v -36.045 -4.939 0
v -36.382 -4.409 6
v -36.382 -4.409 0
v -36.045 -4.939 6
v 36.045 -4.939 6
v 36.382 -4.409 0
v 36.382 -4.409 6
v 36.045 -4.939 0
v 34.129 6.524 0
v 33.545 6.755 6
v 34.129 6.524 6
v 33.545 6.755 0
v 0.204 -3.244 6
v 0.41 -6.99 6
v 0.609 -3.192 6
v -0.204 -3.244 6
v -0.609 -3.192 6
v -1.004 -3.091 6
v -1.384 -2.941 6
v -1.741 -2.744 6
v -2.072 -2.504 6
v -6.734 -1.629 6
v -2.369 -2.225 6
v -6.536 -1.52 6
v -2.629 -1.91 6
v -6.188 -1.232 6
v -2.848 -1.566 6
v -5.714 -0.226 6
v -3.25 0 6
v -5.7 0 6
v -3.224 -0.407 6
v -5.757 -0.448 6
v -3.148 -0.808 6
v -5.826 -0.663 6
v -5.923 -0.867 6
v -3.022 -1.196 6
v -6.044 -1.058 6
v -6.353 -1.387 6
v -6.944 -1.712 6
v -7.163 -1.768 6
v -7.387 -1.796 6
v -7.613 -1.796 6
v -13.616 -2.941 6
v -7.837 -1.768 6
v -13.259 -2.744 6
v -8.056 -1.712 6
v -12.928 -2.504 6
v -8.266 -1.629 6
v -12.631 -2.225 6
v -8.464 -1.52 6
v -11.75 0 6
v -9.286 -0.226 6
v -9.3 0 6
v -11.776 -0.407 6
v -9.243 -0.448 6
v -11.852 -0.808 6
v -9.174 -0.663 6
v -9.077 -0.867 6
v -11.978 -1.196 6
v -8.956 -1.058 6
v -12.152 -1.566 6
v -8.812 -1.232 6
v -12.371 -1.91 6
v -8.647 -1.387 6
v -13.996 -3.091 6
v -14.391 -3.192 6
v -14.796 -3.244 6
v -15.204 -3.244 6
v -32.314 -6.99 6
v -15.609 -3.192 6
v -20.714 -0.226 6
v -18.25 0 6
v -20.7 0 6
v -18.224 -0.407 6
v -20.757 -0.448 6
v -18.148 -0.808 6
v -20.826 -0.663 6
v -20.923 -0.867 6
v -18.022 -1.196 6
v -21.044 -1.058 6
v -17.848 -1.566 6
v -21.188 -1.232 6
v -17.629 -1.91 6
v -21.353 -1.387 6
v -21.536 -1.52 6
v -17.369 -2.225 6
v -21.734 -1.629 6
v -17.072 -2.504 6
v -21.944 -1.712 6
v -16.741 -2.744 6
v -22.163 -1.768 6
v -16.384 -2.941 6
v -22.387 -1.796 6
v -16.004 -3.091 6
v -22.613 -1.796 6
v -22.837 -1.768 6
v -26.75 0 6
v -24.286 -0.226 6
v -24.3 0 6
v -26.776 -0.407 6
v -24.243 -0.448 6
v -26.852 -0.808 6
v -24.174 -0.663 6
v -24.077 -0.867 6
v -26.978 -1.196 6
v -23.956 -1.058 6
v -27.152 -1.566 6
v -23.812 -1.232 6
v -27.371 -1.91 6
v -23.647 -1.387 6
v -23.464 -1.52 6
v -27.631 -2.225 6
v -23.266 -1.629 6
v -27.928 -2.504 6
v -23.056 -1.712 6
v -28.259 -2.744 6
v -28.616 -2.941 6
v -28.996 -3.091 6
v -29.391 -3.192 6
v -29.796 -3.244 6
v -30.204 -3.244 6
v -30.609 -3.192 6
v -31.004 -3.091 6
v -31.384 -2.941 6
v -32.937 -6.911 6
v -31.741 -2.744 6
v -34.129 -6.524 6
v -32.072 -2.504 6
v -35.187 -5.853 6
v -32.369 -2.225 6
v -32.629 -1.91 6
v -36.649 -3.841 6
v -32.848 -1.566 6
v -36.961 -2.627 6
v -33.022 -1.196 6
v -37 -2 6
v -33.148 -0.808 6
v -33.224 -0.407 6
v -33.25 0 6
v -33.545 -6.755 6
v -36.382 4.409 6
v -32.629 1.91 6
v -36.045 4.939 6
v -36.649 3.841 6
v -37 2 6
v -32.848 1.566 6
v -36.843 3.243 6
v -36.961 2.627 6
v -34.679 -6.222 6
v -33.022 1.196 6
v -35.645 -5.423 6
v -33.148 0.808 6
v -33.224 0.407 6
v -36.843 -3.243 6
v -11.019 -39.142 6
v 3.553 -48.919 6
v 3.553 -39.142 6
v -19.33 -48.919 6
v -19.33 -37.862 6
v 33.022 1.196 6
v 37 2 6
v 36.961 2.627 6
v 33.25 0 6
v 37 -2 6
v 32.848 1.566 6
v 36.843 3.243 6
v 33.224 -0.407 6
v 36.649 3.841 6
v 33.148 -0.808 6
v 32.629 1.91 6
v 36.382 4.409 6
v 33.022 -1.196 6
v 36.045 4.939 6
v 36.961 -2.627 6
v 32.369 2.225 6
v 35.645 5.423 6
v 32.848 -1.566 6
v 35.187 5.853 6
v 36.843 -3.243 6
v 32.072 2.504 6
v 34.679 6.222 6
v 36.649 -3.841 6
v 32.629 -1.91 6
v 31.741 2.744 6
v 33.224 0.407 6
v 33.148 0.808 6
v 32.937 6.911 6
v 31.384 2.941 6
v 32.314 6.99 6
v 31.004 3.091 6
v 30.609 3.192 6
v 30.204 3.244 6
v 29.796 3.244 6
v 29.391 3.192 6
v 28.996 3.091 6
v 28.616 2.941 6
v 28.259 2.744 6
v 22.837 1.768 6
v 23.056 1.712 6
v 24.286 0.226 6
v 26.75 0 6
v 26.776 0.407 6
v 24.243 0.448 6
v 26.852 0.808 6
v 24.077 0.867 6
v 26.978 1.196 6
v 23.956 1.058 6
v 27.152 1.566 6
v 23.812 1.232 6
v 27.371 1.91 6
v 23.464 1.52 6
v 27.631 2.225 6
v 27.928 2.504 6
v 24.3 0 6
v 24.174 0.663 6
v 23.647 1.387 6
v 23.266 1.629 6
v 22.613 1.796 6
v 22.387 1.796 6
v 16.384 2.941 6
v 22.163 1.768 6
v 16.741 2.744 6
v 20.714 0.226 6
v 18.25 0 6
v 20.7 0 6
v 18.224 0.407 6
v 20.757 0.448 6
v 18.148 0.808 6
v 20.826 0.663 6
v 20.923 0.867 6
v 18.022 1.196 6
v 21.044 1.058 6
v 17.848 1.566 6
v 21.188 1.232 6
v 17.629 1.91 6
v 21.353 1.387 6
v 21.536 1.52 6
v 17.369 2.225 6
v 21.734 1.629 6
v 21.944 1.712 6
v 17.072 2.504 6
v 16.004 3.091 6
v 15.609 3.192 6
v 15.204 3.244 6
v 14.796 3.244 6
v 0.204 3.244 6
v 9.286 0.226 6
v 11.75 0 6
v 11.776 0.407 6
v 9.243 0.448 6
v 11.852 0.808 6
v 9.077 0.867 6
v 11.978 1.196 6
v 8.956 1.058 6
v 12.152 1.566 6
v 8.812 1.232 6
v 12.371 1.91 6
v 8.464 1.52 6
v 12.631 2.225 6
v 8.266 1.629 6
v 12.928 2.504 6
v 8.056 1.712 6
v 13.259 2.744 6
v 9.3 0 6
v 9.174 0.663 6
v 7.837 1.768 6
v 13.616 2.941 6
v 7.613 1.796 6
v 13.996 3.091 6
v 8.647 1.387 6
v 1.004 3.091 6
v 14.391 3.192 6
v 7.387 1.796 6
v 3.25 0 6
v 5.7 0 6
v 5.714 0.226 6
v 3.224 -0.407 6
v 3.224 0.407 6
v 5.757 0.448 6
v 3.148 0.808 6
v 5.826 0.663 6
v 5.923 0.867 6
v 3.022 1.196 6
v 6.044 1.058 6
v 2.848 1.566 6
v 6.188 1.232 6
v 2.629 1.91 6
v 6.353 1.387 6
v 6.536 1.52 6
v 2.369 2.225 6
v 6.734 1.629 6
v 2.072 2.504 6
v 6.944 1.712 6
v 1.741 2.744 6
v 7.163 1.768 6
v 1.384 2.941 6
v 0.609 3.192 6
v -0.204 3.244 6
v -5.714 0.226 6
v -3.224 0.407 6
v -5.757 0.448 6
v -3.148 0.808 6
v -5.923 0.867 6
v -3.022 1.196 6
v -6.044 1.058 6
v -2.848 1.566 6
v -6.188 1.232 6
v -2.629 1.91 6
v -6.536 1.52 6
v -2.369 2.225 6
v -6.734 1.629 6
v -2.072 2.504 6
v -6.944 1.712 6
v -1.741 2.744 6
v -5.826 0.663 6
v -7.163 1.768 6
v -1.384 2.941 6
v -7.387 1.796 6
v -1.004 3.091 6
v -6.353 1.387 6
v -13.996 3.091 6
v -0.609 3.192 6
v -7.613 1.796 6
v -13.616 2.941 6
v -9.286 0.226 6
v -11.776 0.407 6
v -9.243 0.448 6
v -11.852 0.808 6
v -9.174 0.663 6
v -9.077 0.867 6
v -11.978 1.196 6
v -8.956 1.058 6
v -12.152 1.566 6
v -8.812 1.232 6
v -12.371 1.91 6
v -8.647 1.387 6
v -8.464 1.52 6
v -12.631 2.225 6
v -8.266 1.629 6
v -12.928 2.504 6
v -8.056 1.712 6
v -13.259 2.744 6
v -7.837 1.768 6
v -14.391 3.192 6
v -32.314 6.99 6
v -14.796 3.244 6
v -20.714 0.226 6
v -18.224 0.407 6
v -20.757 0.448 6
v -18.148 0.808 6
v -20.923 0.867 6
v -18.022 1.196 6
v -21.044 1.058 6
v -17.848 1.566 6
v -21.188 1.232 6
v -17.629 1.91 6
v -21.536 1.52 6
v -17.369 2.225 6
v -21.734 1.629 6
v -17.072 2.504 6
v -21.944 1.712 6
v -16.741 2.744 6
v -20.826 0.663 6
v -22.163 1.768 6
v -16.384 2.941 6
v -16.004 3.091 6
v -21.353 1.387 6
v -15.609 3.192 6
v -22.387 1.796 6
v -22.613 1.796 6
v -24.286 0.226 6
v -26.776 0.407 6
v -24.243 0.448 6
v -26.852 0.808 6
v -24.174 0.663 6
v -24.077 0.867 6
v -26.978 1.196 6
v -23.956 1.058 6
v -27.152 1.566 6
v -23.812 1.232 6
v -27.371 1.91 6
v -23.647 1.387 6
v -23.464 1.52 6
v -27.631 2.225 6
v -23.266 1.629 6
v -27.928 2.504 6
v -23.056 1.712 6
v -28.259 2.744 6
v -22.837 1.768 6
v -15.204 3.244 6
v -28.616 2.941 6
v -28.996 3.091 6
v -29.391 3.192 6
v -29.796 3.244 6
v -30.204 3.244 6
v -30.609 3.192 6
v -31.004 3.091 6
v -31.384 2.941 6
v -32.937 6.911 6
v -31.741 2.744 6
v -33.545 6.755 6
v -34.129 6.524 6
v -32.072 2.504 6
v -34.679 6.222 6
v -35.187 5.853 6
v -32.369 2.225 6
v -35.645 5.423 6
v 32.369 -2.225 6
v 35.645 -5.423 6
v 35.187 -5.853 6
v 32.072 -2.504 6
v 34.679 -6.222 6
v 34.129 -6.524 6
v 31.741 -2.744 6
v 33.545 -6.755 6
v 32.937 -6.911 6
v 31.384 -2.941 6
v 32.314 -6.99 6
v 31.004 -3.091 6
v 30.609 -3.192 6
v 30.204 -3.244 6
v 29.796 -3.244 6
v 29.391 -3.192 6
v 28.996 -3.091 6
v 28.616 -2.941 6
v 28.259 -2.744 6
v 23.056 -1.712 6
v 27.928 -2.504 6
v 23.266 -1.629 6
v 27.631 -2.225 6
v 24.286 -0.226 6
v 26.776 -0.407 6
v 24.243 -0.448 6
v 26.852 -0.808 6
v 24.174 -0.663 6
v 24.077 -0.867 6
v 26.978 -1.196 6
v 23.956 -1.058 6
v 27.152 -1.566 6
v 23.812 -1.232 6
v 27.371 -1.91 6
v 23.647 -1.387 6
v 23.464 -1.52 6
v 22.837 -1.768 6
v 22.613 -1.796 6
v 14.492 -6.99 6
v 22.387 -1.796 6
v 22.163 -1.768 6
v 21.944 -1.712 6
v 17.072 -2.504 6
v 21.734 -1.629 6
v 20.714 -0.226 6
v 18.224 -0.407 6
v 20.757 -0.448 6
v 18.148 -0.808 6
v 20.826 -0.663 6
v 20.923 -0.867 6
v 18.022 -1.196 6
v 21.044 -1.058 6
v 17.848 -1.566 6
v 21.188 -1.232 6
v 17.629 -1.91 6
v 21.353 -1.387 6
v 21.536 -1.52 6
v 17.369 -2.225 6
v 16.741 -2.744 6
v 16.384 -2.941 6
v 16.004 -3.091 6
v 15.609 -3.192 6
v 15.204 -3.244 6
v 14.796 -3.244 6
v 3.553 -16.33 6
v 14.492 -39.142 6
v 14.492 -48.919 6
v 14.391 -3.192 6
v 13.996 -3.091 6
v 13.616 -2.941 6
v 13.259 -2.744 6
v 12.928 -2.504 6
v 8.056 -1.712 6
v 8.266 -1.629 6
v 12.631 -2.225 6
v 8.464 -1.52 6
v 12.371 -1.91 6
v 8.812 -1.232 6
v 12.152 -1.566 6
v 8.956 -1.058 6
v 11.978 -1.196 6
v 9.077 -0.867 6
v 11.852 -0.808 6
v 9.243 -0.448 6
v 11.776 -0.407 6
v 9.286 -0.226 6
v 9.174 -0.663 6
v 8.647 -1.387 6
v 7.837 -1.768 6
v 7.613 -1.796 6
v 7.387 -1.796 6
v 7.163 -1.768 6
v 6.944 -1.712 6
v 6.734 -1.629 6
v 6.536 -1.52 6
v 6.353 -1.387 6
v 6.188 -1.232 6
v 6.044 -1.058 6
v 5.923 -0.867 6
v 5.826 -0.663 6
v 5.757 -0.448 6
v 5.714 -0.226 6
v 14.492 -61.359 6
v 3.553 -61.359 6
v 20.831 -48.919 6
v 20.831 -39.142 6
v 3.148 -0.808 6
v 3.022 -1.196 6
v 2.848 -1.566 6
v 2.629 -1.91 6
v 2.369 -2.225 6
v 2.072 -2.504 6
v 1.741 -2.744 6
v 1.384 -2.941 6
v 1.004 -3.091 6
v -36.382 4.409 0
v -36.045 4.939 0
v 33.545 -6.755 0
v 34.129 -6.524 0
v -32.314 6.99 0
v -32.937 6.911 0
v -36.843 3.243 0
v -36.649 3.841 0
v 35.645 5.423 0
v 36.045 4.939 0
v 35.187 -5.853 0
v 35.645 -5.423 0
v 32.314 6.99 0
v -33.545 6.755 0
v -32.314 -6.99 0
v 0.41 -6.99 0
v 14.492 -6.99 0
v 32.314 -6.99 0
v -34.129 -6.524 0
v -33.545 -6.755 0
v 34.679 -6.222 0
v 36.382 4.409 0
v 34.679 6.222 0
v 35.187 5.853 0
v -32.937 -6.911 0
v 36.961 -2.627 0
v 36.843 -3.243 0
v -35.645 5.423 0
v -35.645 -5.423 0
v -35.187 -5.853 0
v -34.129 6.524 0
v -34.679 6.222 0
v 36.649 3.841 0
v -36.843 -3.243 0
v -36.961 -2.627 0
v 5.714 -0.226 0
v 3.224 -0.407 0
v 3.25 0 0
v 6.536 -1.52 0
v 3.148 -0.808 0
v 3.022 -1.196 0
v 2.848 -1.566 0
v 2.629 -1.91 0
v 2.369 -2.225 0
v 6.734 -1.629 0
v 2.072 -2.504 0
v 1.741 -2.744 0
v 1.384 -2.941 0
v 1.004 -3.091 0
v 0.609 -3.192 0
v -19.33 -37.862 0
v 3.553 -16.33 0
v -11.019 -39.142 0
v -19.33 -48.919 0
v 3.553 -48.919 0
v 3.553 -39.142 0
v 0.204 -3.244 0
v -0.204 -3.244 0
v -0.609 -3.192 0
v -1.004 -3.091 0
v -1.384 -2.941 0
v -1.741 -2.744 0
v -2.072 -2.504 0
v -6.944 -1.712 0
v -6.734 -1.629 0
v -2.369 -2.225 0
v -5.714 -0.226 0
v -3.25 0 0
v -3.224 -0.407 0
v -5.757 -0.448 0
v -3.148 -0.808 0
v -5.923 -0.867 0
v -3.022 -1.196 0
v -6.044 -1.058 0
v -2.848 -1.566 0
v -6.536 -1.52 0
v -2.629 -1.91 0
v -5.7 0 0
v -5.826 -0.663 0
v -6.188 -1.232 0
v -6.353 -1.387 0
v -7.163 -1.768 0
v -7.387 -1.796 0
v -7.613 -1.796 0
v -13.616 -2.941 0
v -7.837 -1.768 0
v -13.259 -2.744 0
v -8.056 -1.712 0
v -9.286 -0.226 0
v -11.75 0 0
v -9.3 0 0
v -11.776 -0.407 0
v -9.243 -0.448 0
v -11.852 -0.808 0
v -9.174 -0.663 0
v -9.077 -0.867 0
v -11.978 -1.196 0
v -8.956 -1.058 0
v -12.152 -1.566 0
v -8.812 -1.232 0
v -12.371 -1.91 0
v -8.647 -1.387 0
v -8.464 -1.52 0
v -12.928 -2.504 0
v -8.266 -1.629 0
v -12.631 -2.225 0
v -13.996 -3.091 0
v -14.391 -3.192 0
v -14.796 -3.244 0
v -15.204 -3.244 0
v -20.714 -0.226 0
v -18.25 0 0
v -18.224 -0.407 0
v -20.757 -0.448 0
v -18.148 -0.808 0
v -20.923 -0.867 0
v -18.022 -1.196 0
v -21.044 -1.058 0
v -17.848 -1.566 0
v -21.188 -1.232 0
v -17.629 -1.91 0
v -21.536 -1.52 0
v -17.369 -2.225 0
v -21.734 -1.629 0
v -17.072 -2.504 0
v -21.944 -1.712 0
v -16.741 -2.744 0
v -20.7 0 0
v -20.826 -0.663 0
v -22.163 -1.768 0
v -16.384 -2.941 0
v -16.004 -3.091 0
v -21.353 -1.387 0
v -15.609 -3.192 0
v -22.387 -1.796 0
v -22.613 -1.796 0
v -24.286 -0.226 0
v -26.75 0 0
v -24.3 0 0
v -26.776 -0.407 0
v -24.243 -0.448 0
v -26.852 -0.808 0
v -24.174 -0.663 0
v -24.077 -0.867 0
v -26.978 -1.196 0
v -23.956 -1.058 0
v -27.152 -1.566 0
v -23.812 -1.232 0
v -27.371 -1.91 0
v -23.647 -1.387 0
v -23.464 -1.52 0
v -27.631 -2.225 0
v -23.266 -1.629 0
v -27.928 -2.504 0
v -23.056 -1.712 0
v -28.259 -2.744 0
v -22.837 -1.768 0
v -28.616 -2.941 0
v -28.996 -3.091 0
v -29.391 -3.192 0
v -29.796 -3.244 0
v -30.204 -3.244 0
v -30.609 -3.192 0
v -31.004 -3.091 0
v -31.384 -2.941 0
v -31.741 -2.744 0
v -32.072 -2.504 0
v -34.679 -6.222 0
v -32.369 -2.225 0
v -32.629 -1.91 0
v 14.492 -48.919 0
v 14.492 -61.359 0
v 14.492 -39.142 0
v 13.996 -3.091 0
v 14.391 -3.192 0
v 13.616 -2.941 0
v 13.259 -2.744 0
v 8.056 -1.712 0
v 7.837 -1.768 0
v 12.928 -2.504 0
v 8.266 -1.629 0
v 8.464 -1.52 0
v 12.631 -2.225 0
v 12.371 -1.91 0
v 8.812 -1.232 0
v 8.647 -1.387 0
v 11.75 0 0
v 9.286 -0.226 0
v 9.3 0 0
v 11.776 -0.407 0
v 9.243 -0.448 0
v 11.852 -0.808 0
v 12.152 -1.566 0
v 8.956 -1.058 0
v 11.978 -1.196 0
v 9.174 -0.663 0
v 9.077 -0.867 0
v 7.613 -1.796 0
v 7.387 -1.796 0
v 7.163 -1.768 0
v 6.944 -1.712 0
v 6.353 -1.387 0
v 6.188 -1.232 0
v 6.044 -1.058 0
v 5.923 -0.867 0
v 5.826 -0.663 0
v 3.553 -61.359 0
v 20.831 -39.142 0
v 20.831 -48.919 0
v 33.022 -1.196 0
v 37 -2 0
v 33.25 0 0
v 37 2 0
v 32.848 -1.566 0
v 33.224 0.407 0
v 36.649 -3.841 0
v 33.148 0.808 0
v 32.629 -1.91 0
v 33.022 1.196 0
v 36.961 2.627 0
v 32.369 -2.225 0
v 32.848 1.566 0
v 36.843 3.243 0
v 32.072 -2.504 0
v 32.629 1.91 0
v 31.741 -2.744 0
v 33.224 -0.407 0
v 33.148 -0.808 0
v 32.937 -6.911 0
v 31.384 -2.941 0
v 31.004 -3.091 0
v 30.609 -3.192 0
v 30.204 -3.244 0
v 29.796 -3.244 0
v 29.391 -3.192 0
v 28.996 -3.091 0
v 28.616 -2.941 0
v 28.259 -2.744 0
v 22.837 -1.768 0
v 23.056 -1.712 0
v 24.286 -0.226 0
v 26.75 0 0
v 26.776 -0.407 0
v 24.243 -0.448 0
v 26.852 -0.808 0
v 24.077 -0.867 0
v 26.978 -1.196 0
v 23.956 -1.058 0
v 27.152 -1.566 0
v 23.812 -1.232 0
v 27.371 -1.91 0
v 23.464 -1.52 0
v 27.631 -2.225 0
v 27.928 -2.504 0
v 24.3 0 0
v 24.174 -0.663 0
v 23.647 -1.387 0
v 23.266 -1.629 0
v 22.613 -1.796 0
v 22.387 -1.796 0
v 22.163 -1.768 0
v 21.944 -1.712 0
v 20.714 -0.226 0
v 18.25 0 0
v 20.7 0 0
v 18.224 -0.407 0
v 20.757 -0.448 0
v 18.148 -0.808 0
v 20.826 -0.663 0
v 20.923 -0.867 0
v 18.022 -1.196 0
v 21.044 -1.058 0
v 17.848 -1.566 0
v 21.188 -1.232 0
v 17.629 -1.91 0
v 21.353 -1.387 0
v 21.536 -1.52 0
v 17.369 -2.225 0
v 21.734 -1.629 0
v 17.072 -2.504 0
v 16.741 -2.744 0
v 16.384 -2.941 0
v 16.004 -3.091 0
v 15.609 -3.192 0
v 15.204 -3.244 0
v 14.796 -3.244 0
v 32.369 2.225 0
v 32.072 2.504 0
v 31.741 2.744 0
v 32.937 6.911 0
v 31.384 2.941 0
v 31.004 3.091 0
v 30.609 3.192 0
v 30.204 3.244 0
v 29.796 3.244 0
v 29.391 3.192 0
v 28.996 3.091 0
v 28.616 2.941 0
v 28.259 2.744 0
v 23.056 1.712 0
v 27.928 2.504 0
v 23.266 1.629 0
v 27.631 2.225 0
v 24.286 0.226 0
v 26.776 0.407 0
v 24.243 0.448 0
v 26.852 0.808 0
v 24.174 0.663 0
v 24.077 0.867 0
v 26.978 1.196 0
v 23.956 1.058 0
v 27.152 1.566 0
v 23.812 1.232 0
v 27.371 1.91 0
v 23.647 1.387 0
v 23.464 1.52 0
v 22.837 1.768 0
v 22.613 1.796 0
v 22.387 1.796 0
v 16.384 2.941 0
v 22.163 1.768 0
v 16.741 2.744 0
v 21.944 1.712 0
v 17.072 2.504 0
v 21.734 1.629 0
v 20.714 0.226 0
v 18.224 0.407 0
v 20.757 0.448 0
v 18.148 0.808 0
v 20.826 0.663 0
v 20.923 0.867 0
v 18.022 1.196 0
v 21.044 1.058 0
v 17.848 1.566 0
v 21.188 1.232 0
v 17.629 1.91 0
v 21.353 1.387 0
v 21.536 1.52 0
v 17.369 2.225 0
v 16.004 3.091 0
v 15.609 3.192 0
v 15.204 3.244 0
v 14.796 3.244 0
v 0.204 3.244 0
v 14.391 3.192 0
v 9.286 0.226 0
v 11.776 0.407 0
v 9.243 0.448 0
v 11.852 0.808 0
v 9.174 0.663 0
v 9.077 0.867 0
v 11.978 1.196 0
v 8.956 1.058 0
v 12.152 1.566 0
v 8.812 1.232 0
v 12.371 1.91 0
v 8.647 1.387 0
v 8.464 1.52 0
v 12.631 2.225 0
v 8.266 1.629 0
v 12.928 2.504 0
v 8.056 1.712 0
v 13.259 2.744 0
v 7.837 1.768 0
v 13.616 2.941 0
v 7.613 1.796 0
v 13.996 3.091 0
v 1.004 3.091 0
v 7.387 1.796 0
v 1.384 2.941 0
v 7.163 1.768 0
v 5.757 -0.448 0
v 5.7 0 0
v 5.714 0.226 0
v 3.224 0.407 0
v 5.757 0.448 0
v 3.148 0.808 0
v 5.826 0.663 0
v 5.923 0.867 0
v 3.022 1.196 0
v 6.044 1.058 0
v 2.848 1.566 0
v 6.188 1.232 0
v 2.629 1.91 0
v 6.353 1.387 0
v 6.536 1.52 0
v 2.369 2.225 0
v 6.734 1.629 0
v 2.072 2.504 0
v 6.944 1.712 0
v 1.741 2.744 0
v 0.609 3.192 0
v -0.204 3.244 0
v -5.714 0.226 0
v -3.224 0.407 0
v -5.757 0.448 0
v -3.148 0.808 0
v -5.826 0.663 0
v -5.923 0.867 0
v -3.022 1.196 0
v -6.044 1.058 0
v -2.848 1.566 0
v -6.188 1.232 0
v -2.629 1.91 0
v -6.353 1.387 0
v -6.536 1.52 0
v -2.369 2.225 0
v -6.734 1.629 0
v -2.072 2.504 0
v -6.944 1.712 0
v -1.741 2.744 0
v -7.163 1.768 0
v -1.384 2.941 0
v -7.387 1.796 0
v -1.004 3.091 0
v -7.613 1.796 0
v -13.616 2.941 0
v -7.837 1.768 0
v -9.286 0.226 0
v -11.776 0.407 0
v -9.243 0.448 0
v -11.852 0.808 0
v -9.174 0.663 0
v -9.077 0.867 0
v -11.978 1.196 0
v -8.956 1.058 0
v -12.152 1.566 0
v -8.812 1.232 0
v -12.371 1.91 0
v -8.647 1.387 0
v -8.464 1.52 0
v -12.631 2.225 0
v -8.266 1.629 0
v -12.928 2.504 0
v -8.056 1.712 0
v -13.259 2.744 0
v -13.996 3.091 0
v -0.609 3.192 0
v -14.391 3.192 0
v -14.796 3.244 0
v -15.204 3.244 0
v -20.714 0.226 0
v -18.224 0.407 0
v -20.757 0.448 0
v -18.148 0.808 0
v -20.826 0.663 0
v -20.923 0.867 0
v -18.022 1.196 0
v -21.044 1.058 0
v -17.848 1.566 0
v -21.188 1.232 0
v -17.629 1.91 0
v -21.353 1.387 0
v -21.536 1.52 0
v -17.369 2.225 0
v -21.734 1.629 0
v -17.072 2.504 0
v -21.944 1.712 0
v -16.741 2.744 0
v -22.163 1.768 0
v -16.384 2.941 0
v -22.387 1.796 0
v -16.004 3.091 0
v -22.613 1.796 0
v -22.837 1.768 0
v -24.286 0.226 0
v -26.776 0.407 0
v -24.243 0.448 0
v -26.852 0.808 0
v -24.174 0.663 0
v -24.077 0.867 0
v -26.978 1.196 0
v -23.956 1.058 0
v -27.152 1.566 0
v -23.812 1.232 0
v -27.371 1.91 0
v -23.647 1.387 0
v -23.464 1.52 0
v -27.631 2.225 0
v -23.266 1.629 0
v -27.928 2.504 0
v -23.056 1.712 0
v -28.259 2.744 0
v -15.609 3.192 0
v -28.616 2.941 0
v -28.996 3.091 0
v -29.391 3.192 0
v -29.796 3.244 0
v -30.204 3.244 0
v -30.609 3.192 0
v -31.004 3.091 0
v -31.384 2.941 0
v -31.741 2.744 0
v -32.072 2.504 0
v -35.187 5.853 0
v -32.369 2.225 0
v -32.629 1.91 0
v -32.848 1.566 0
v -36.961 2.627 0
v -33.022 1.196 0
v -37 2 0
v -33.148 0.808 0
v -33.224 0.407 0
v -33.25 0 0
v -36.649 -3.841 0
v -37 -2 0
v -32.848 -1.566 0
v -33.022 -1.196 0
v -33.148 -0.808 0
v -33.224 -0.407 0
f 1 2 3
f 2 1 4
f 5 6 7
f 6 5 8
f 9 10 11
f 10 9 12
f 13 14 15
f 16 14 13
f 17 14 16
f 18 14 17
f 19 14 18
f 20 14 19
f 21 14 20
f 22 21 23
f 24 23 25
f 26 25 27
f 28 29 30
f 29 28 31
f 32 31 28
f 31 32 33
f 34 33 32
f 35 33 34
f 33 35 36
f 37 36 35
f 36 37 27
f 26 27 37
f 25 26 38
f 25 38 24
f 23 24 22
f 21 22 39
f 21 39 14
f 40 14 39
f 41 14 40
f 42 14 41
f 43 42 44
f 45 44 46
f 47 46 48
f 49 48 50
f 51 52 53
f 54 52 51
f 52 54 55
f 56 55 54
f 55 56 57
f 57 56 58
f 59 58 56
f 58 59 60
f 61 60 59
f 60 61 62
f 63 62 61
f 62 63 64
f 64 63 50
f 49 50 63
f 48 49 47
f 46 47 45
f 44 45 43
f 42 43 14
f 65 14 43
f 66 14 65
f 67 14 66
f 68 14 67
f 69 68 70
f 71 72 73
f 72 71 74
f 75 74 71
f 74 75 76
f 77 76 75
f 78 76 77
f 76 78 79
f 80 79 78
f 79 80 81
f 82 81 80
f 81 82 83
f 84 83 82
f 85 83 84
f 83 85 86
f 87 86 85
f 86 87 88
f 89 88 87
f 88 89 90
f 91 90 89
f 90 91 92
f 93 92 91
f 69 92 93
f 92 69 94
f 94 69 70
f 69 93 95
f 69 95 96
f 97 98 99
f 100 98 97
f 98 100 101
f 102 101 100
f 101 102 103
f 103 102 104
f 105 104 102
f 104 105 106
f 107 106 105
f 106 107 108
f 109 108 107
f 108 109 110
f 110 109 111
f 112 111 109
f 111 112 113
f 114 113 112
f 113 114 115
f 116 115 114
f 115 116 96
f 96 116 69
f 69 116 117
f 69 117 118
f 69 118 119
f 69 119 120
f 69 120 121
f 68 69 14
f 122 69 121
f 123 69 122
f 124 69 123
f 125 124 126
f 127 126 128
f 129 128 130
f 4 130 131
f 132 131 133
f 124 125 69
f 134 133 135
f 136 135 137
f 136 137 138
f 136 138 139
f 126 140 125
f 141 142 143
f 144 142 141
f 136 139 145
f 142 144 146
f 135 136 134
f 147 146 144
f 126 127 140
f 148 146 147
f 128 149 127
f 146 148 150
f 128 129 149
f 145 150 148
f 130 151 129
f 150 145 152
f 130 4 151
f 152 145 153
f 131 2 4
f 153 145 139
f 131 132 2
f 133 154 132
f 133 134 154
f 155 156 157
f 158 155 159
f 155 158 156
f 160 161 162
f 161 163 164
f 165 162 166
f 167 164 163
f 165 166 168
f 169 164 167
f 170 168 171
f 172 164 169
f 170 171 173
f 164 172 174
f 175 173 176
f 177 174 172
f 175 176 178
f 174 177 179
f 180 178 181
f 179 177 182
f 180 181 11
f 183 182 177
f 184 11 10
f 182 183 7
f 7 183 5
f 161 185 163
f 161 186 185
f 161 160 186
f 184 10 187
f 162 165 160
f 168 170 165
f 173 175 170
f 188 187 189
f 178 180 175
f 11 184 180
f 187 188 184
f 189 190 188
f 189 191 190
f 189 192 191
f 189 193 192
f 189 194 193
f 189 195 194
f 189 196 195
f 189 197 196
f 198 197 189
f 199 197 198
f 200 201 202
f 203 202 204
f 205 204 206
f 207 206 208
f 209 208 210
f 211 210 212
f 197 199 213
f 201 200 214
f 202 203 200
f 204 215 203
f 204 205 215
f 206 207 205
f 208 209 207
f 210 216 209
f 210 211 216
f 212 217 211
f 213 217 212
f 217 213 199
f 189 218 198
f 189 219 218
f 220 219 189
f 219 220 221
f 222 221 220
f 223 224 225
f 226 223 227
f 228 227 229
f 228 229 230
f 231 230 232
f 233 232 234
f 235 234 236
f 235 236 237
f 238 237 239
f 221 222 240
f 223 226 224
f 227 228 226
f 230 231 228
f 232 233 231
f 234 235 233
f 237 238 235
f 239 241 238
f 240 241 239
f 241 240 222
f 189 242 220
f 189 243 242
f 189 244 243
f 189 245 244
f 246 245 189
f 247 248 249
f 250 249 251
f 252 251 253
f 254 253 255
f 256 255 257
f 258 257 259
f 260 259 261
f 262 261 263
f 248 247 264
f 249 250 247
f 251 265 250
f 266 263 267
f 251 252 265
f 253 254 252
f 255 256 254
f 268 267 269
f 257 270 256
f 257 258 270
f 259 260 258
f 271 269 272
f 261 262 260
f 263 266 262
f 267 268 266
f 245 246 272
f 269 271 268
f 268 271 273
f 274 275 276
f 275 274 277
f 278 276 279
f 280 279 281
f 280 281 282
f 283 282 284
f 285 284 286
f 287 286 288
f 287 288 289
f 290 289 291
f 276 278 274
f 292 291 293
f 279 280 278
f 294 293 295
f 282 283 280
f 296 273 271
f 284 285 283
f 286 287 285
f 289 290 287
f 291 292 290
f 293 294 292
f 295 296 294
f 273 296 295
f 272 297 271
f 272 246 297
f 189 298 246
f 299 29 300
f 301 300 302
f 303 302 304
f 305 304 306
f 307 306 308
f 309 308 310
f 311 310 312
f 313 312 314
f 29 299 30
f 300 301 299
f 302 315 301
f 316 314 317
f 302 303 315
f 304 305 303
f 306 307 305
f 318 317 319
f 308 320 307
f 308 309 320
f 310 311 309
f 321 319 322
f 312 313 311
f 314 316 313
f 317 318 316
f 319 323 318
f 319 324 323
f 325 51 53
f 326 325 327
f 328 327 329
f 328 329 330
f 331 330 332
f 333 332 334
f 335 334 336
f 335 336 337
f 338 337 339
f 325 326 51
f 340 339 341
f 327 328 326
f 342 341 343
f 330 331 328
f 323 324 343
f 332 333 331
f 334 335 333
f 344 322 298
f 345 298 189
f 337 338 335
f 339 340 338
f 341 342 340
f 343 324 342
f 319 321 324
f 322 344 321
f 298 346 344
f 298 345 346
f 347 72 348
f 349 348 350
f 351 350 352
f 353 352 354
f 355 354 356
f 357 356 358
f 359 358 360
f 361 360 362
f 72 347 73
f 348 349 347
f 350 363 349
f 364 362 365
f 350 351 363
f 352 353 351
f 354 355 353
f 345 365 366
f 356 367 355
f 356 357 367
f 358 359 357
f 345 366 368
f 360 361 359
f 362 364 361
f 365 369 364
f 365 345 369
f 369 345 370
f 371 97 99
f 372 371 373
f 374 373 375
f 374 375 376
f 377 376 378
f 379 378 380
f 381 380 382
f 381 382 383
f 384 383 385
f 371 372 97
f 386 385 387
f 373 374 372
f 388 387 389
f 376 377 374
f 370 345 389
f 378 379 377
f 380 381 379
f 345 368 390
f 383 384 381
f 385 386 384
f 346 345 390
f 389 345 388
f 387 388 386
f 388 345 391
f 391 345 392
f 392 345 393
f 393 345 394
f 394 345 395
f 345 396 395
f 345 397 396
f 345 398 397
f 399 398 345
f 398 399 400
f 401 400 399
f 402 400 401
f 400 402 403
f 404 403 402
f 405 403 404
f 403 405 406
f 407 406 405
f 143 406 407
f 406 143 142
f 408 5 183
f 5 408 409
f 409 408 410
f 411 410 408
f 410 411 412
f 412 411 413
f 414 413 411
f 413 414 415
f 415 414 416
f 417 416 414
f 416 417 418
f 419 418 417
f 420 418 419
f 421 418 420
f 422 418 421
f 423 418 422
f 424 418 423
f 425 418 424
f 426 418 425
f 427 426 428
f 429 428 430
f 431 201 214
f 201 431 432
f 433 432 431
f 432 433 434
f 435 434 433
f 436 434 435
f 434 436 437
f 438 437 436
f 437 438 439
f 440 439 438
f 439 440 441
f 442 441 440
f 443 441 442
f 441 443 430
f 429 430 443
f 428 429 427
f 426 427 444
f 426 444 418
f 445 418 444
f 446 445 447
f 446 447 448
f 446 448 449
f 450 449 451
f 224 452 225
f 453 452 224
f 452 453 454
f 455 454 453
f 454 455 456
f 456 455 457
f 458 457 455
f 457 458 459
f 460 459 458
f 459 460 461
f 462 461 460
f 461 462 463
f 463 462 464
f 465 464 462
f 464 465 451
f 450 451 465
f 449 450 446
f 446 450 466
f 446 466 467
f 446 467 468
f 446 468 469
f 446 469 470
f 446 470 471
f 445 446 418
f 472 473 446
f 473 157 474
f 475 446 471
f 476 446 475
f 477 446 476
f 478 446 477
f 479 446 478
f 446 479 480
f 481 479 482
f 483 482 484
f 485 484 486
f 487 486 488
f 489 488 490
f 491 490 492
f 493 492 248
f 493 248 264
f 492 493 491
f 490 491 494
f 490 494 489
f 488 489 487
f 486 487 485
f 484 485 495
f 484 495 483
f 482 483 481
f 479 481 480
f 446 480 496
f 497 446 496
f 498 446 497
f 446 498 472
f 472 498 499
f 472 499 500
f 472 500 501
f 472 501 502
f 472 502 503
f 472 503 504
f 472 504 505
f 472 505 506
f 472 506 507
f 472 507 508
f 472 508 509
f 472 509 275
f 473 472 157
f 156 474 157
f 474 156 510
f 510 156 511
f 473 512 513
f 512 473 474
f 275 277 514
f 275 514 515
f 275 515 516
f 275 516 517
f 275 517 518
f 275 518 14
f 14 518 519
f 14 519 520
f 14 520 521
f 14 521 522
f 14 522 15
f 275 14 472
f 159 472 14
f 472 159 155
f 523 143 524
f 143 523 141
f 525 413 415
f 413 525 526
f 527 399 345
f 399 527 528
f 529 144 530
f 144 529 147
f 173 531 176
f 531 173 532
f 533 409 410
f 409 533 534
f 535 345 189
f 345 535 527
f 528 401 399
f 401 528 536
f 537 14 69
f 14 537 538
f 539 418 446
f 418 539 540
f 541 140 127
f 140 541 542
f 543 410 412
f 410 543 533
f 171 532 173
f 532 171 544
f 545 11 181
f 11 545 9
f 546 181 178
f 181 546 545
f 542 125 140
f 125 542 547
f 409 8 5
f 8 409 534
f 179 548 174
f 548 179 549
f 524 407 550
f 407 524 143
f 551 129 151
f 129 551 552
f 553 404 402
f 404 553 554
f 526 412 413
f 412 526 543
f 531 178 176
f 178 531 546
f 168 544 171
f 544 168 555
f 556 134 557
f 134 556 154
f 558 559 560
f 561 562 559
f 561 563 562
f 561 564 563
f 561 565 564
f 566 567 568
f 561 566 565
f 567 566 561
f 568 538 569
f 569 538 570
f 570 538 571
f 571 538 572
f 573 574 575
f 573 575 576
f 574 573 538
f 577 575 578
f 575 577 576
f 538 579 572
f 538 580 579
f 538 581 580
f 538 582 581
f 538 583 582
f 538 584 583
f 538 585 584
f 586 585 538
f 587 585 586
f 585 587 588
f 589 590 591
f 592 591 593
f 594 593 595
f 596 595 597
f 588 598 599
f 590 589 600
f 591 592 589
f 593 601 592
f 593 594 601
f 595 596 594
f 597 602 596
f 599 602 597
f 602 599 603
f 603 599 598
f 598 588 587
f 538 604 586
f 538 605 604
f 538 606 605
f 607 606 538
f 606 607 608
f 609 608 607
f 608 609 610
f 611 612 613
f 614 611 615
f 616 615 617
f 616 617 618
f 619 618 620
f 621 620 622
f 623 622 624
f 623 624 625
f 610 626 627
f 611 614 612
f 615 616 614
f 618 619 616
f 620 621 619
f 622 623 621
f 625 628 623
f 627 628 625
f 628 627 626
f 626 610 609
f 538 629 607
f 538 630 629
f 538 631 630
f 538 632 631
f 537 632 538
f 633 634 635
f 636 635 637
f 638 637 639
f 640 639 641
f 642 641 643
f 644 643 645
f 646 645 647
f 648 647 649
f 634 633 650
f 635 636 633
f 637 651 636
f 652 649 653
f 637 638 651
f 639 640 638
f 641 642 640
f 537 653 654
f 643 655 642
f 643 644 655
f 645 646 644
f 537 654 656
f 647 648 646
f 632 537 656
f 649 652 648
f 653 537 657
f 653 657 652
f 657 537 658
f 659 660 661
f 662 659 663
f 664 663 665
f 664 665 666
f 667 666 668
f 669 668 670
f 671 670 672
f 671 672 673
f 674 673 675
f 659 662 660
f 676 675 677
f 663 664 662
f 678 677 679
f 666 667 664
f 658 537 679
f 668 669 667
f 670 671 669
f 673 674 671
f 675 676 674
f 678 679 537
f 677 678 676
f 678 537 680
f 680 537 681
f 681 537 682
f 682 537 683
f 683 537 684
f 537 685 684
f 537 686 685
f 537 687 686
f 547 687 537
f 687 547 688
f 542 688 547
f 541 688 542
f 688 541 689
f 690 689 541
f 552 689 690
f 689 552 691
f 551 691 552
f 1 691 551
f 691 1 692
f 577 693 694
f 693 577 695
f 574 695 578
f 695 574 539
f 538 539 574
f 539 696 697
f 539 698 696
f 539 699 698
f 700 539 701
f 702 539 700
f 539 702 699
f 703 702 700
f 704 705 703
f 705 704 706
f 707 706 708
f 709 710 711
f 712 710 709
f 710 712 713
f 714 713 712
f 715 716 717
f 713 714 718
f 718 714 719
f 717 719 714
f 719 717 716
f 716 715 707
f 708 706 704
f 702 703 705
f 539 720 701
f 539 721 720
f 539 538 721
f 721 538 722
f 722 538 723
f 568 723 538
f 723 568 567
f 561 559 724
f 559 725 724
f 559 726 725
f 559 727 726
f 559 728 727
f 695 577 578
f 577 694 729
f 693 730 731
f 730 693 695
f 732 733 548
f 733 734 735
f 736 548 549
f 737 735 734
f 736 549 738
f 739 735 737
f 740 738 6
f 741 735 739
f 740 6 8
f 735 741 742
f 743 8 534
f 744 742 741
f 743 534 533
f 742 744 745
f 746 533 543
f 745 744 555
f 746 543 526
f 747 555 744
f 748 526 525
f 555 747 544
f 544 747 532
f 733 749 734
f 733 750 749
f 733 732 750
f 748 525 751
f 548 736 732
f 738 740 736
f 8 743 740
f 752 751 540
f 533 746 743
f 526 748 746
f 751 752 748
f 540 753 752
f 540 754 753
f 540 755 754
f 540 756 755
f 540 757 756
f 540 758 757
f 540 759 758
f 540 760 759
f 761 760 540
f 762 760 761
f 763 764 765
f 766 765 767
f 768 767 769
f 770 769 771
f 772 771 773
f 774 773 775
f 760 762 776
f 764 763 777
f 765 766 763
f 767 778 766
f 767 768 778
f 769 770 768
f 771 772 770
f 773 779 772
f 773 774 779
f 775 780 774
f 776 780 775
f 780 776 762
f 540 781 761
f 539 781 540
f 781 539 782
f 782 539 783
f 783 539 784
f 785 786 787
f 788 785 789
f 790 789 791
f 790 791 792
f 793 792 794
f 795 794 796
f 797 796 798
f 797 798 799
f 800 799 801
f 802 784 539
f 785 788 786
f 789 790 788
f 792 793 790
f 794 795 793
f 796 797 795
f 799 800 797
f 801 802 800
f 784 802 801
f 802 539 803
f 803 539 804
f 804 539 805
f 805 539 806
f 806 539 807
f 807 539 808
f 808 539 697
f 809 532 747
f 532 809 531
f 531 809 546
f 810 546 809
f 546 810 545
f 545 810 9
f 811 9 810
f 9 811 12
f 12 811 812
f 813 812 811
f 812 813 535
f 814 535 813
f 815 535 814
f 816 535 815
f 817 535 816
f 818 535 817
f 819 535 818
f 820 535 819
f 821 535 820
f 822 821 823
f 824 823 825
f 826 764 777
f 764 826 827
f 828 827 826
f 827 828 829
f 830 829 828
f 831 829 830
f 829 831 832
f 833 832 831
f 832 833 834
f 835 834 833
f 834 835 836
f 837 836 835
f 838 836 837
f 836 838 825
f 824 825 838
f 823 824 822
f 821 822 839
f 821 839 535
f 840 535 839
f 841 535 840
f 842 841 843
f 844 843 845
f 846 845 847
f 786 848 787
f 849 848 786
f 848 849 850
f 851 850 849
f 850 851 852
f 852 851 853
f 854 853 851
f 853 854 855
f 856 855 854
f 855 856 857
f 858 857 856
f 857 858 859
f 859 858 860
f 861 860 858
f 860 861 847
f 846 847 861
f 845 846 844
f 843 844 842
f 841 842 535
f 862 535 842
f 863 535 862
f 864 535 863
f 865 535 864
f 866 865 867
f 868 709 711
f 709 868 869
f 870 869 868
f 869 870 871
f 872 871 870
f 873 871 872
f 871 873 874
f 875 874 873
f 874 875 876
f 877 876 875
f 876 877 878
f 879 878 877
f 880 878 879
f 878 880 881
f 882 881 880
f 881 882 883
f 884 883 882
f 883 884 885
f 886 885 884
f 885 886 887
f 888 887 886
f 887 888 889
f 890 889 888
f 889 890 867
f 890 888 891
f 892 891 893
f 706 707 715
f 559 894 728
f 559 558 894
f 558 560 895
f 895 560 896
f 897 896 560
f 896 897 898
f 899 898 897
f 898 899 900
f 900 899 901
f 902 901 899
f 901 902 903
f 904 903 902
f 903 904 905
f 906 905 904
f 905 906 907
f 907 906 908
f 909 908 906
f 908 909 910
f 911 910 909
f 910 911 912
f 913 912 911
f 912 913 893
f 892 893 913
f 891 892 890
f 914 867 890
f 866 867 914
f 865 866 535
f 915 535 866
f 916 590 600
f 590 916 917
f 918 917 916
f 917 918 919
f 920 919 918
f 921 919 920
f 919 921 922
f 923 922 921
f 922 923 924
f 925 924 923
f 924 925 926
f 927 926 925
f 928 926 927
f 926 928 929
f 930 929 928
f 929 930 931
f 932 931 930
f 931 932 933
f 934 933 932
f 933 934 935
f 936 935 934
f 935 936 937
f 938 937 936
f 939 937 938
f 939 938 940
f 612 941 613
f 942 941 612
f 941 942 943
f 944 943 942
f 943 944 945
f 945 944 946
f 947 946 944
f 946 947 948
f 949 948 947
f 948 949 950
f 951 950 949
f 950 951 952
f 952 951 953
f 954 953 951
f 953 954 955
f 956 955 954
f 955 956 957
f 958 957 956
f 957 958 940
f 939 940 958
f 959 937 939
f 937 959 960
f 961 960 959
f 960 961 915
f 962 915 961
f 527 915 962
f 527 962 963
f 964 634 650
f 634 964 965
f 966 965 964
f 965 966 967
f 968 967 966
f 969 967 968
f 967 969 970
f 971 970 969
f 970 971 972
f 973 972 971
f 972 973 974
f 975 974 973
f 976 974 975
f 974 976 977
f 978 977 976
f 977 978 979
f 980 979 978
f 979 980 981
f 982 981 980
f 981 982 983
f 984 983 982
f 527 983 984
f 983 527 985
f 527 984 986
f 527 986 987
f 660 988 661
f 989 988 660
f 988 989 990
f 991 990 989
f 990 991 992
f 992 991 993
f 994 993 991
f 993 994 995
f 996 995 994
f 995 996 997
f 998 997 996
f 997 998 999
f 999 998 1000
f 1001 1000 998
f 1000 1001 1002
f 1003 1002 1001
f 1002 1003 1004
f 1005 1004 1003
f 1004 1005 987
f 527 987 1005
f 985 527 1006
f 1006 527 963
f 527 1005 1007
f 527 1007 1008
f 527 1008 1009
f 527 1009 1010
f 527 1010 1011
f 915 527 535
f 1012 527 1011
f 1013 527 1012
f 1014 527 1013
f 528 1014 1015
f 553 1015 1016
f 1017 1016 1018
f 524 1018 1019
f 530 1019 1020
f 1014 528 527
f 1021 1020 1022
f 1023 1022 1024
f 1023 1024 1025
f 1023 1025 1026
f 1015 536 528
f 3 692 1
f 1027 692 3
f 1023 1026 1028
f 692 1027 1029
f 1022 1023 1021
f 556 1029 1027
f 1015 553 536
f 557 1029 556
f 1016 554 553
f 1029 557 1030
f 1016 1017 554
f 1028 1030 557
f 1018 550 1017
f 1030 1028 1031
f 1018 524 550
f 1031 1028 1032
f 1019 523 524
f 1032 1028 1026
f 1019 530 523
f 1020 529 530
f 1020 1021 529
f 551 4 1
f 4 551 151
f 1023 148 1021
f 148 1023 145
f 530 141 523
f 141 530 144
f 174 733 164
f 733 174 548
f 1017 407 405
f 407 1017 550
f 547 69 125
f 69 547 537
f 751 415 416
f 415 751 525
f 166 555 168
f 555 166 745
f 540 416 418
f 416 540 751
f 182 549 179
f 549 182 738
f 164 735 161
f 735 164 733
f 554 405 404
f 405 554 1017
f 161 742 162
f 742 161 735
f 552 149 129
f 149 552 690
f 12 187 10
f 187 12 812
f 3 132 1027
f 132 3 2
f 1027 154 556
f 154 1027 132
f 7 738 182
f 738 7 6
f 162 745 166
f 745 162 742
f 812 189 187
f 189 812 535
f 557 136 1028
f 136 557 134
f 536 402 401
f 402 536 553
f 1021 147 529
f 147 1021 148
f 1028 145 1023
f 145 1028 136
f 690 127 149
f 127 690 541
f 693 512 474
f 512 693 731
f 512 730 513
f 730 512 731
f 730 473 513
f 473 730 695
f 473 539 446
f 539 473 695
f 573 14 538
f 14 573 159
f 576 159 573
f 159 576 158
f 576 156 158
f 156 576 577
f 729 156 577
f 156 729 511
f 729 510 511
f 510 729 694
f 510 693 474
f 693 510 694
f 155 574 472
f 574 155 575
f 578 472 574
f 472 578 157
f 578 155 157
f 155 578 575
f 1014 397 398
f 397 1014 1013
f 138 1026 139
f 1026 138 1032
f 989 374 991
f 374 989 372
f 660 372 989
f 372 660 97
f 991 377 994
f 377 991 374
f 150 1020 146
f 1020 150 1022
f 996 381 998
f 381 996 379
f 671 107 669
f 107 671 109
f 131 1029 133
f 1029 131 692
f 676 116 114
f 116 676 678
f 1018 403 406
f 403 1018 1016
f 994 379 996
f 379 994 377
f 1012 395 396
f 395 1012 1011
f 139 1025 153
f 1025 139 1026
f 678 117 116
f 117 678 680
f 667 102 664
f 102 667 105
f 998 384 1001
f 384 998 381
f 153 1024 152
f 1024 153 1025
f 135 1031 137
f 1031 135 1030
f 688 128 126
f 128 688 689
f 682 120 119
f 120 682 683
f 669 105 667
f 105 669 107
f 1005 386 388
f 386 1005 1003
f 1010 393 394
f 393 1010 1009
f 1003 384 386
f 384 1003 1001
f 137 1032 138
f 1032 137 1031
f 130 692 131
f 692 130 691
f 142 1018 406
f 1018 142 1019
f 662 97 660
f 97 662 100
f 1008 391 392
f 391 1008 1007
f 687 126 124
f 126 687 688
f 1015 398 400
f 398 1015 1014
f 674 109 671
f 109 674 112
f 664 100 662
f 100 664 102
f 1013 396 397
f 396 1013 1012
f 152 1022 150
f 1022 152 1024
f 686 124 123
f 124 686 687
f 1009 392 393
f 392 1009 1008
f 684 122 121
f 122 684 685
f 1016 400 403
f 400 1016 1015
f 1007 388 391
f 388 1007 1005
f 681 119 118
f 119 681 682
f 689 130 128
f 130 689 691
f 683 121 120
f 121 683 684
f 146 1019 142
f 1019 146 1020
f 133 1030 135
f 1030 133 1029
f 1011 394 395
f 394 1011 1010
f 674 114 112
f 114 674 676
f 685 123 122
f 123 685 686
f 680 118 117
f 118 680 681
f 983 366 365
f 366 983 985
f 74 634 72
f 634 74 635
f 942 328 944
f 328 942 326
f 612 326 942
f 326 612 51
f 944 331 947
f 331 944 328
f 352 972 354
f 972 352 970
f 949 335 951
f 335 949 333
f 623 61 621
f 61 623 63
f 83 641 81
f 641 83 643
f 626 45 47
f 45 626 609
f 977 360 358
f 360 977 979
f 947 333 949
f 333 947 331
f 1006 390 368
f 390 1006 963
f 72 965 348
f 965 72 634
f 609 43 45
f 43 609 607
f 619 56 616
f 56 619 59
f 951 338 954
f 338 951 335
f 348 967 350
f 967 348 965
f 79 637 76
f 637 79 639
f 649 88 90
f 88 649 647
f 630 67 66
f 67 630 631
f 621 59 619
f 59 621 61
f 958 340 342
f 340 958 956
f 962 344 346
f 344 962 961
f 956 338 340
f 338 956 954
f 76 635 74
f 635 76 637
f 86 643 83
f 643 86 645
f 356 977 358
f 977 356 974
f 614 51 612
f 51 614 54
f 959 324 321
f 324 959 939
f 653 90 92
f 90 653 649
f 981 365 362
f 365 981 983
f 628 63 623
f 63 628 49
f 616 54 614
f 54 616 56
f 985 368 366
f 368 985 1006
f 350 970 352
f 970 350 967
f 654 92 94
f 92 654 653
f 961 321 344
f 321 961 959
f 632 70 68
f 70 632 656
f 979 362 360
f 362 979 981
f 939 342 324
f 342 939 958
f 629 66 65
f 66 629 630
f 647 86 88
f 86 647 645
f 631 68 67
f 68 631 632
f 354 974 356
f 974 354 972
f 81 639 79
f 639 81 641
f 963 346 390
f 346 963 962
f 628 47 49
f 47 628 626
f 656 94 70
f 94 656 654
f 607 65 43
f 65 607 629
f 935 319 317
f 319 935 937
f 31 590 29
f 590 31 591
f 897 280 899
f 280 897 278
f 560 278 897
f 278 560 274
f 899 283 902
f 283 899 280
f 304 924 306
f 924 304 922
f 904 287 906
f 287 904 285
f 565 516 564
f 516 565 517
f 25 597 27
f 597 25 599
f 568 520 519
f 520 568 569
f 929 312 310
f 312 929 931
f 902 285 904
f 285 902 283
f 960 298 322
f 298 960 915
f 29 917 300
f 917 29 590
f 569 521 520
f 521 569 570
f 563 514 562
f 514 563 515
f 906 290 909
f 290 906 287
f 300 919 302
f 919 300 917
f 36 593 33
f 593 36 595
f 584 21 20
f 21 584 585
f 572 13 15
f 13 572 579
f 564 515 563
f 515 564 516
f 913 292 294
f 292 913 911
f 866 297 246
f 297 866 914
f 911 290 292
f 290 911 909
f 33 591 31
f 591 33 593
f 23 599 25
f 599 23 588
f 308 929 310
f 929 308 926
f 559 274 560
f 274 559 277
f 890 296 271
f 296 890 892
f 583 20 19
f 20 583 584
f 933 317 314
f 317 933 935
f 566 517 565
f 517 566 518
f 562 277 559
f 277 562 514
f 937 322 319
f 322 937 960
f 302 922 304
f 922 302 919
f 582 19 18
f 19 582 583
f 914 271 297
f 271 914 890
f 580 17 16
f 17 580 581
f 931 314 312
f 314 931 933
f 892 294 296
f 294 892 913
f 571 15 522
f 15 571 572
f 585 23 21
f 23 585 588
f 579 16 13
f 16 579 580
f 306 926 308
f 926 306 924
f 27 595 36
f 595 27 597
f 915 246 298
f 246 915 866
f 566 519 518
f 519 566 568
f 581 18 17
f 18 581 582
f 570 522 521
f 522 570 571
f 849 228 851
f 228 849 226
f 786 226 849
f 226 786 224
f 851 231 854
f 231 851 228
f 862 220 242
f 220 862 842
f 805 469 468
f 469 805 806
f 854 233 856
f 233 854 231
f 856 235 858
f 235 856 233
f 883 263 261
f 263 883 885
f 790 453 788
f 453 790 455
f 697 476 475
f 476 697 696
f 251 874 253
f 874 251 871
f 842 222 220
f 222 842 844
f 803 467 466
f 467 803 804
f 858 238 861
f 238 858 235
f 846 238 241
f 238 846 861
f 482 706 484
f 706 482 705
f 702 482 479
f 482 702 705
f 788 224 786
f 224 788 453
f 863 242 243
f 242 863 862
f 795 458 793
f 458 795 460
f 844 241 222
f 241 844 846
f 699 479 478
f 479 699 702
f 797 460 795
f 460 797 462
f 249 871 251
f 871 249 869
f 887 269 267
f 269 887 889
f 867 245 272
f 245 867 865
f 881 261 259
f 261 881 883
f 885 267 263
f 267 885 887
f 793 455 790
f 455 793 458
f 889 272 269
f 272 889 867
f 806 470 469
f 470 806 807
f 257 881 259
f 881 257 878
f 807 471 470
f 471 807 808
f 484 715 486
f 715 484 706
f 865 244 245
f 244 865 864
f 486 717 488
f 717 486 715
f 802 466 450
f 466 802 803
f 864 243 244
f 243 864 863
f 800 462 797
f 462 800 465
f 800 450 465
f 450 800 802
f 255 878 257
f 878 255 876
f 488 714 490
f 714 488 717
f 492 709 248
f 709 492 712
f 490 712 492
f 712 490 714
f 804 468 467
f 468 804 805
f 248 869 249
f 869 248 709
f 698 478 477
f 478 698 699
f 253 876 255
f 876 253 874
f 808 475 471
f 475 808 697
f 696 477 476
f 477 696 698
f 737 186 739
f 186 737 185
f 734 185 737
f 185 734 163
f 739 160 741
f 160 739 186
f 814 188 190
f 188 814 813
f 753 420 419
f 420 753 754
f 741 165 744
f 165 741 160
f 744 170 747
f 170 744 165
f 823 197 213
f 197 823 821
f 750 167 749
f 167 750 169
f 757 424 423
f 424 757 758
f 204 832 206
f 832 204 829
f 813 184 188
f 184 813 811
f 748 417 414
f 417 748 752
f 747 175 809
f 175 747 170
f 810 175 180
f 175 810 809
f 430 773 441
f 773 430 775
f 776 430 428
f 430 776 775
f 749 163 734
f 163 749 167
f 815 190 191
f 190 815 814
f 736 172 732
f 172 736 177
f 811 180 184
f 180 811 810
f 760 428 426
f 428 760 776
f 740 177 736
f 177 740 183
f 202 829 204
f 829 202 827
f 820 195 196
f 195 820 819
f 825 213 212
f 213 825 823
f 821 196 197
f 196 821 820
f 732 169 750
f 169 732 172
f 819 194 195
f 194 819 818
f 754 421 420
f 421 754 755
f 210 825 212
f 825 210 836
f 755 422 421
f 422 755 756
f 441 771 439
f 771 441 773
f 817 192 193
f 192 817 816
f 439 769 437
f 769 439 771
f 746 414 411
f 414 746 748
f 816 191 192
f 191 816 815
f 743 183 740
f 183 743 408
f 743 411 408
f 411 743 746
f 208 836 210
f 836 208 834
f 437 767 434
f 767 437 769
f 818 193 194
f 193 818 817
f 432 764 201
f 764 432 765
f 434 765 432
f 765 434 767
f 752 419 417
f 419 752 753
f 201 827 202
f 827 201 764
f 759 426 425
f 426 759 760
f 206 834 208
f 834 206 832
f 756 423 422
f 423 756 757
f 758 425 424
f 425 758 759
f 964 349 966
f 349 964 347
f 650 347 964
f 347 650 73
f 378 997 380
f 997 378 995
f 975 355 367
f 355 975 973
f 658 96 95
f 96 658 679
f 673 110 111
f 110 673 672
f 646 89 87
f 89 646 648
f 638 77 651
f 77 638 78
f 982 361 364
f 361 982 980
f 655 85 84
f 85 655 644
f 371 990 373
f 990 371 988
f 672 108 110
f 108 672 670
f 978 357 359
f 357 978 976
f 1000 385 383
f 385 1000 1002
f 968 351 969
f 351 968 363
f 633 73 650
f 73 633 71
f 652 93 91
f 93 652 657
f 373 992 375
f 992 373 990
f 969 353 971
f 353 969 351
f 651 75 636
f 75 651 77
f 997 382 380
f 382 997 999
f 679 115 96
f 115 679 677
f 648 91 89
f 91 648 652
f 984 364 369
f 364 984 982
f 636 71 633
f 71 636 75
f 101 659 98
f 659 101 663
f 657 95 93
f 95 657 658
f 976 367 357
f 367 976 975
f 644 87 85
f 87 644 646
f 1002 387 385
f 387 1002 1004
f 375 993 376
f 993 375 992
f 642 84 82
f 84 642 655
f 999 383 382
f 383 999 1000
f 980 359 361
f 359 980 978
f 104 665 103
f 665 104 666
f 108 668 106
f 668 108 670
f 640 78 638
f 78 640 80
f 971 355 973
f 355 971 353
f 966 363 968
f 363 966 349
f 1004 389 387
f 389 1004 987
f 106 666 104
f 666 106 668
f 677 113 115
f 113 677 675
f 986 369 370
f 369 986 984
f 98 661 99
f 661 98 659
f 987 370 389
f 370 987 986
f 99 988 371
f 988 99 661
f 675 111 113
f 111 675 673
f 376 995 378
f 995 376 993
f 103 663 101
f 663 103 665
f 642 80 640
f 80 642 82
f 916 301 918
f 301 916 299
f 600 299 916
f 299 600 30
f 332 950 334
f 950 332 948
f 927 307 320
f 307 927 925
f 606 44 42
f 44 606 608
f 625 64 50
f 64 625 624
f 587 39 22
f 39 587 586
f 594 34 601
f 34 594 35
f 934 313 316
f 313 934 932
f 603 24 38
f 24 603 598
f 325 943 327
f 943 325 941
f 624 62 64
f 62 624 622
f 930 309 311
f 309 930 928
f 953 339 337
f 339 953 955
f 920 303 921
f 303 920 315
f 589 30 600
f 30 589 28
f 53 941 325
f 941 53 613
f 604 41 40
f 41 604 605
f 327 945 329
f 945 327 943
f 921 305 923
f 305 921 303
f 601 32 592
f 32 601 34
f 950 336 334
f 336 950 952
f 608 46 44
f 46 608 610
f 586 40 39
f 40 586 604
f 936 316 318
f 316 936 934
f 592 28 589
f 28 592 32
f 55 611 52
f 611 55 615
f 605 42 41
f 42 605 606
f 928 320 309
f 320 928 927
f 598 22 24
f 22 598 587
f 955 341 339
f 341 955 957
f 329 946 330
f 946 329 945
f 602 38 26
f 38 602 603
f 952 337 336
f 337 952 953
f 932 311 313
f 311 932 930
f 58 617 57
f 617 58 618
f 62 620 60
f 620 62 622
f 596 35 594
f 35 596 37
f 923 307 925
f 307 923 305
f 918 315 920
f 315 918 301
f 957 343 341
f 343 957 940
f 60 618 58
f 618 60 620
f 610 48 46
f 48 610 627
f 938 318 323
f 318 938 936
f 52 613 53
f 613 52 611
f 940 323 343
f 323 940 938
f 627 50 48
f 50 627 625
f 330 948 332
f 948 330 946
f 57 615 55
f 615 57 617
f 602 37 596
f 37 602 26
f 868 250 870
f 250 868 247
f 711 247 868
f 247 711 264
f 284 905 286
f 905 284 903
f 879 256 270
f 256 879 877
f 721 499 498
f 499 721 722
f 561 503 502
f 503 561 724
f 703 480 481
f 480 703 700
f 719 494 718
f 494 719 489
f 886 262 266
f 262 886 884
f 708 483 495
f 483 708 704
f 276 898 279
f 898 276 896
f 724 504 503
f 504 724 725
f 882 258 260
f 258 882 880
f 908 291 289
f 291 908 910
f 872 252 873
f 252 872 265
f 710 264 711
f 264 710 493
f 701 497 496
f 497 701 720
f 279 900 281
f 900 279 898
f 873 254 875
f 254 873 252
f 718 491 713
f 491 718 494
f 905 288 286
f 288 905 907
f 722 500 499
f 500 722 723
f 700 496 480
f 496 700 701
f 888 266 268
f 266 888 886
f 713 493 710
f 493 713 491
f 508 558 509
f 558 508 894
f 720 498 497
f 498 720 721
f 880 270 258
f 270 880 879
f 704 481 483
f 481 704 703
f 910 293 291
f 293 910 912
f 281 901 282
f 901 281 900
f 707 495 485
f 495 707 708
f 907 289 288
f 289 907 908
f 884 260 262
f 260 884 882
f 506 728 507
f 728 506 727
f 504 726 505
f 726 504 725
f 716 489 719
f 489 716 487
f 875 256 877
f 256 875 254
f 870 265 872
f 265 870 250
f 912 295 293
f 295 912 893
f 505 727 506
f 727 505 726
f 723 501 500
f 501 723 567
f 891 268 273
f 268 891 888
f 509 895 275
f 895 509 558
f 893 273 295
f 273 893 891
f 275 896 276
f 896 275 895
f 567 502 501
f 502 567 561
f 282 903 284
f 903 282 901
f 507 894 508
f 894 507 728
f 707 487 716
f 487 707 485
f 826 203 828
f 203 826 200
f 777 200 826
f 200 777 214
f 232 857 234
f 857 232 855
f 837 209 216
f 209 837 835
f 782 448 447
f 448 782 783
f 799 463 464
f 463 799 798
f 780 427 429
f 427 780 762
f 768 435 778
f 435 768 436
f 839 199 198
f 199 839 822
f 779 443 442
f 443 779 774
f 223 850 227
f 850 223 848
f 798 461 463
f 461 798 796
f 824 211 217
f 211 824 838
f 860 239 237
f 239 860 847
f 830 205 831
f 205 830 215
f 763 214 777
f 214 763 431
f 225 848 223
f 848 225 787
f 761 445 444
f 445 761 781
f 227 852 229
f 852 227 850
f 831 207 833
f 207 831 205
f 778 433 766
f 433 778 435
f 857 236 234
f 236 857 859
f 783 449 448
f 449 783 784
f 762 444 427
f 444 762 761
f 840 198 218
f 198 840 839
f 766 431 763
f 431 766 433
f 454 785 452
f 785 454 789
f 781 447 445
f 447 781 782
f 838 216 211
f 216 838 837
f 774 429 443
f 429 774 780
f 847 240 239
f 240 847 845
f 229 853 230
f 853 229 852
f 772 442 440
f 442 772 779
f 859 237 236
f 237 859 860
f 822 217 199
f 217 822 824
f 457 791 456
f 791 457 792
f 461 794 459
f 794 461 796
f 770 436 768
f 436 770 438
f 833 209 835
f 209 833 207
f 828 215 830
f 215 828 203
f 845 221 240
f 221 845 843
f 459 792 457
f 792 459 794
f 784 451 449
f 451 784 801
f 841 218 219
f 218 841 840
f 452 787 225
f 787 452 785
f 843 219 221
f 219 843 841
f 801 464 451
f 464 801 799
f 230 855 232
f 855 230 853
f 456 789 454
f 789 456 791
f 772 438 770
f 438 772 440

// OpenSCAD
$fn = 50;


difference() {
	union() {
		hull() {
			translate(v = [-32.0000000000, 2.0000000000, 0]) {
				cylinder(h = 6, r = 5);
			}
			translate(v = [32.0000000000, 2.0000000000, 0]) {
				cylinder(h = 6, r = 5);
			}
			translate(v = [-32.0000000000, -2.0000000000, 0]) {
				cylinder(h = 6, r = 5);
			}
			translate(v = [32.0000000000, -2.0000000000, 0]) {
				cylinder(h = 6, r = 5);
			}
		}
		translate(v = [0, -5, 0]) {
			linear_extrude(height = 6) {
				text(font = "DejaVu Sans Mono:style=Bold", halign = "center", size = 57.0000000000, text = "4", valign = "top");
			}
		}
	}
	union() {
		translate(v = [-30.0000000000, 0.0000000000, 0]) {
			translate(v = [0, 0, -100]) {
				cylinder(h = 200, r = 3.2500000000);
			}
		}
		translate(v = [-15.0000000000, 0.0000000000, 0]) {
			translate(v = [0, 0, -100]) {
				cylinder(h = 200, r = 3.2500000000);
			}
		}
		translate(v = [0, 0, -100]) {
			cylinder(h = 200, r = 3.2500000000);
		}
		translate(v = [15.0000000000, 0.0000000000, 0]) {
			translate(v = [0, 0, -100]) {
				cylinder(h = 200, r = 3.2500000000);
			}
		}
		translate(v = [30.0000000000, 0.0000000000, 0]) {
			translate(v = [0, 0, -100]) {
				cylinder(h = 200, r = 3.2500000000);
			}
		}
		translate(v = [-30.0000000000, 0.0000000000, 0]) {
			translate(v = [0, 0, -100]) {
				cylinder(h = 200, r = 1.8000000000);
			}
		}
		translate(v = [-22.5000000000, 0.0000000000, 0]) {
			translate(v = [0, 0, -100]) {
				cylinder(h = 200, r = 1.8000000000);
			}
		}
		translate(v = [-15.0000000000, 0.0000000000, 0]) {
			translate(v = [0, 0, -100]) {
				cylinder(h = 200, r = 1.8000000000);
			}
		}
		translate(v = [-7.5000000000, 0.0000000000, 0]) {
			translate(v = [0, 0, -100]) {
				cylinder(h = 200, r = 1.8000000000);
			}
		}
		translate(v = [0, 0, -100]) {
			cylinder(h = 200, r = 1.8000000000);
		}
		translate(v = [7.5000000000, 0.0000000000, 0]) {
			translate(v = [0, 0, -100]) {
				cylinder(h = 200, r = 1.8000000000);
			}
		}
		translate(v = [15.0000000000, 0.0000000000, 0]) {
			translate(v = [0, 0, -100]) {
				cylinder(h = 200, r = 1.8000000000);
			}
		}
		translate(v = [22.5000000000, 0.0000000000, 0]) {
			translate(v = [0, 0, -100]) {
				cylinder(h = 200, r = 1.8000000000);
			}
		}
		translate(v = [30.0000000000, 0.0000000000, 0]) {
			translate(v = [0, 0, -100]) {
				cylinder(h = 200, r = 1.8000000000);
			}
		}
	}
}
